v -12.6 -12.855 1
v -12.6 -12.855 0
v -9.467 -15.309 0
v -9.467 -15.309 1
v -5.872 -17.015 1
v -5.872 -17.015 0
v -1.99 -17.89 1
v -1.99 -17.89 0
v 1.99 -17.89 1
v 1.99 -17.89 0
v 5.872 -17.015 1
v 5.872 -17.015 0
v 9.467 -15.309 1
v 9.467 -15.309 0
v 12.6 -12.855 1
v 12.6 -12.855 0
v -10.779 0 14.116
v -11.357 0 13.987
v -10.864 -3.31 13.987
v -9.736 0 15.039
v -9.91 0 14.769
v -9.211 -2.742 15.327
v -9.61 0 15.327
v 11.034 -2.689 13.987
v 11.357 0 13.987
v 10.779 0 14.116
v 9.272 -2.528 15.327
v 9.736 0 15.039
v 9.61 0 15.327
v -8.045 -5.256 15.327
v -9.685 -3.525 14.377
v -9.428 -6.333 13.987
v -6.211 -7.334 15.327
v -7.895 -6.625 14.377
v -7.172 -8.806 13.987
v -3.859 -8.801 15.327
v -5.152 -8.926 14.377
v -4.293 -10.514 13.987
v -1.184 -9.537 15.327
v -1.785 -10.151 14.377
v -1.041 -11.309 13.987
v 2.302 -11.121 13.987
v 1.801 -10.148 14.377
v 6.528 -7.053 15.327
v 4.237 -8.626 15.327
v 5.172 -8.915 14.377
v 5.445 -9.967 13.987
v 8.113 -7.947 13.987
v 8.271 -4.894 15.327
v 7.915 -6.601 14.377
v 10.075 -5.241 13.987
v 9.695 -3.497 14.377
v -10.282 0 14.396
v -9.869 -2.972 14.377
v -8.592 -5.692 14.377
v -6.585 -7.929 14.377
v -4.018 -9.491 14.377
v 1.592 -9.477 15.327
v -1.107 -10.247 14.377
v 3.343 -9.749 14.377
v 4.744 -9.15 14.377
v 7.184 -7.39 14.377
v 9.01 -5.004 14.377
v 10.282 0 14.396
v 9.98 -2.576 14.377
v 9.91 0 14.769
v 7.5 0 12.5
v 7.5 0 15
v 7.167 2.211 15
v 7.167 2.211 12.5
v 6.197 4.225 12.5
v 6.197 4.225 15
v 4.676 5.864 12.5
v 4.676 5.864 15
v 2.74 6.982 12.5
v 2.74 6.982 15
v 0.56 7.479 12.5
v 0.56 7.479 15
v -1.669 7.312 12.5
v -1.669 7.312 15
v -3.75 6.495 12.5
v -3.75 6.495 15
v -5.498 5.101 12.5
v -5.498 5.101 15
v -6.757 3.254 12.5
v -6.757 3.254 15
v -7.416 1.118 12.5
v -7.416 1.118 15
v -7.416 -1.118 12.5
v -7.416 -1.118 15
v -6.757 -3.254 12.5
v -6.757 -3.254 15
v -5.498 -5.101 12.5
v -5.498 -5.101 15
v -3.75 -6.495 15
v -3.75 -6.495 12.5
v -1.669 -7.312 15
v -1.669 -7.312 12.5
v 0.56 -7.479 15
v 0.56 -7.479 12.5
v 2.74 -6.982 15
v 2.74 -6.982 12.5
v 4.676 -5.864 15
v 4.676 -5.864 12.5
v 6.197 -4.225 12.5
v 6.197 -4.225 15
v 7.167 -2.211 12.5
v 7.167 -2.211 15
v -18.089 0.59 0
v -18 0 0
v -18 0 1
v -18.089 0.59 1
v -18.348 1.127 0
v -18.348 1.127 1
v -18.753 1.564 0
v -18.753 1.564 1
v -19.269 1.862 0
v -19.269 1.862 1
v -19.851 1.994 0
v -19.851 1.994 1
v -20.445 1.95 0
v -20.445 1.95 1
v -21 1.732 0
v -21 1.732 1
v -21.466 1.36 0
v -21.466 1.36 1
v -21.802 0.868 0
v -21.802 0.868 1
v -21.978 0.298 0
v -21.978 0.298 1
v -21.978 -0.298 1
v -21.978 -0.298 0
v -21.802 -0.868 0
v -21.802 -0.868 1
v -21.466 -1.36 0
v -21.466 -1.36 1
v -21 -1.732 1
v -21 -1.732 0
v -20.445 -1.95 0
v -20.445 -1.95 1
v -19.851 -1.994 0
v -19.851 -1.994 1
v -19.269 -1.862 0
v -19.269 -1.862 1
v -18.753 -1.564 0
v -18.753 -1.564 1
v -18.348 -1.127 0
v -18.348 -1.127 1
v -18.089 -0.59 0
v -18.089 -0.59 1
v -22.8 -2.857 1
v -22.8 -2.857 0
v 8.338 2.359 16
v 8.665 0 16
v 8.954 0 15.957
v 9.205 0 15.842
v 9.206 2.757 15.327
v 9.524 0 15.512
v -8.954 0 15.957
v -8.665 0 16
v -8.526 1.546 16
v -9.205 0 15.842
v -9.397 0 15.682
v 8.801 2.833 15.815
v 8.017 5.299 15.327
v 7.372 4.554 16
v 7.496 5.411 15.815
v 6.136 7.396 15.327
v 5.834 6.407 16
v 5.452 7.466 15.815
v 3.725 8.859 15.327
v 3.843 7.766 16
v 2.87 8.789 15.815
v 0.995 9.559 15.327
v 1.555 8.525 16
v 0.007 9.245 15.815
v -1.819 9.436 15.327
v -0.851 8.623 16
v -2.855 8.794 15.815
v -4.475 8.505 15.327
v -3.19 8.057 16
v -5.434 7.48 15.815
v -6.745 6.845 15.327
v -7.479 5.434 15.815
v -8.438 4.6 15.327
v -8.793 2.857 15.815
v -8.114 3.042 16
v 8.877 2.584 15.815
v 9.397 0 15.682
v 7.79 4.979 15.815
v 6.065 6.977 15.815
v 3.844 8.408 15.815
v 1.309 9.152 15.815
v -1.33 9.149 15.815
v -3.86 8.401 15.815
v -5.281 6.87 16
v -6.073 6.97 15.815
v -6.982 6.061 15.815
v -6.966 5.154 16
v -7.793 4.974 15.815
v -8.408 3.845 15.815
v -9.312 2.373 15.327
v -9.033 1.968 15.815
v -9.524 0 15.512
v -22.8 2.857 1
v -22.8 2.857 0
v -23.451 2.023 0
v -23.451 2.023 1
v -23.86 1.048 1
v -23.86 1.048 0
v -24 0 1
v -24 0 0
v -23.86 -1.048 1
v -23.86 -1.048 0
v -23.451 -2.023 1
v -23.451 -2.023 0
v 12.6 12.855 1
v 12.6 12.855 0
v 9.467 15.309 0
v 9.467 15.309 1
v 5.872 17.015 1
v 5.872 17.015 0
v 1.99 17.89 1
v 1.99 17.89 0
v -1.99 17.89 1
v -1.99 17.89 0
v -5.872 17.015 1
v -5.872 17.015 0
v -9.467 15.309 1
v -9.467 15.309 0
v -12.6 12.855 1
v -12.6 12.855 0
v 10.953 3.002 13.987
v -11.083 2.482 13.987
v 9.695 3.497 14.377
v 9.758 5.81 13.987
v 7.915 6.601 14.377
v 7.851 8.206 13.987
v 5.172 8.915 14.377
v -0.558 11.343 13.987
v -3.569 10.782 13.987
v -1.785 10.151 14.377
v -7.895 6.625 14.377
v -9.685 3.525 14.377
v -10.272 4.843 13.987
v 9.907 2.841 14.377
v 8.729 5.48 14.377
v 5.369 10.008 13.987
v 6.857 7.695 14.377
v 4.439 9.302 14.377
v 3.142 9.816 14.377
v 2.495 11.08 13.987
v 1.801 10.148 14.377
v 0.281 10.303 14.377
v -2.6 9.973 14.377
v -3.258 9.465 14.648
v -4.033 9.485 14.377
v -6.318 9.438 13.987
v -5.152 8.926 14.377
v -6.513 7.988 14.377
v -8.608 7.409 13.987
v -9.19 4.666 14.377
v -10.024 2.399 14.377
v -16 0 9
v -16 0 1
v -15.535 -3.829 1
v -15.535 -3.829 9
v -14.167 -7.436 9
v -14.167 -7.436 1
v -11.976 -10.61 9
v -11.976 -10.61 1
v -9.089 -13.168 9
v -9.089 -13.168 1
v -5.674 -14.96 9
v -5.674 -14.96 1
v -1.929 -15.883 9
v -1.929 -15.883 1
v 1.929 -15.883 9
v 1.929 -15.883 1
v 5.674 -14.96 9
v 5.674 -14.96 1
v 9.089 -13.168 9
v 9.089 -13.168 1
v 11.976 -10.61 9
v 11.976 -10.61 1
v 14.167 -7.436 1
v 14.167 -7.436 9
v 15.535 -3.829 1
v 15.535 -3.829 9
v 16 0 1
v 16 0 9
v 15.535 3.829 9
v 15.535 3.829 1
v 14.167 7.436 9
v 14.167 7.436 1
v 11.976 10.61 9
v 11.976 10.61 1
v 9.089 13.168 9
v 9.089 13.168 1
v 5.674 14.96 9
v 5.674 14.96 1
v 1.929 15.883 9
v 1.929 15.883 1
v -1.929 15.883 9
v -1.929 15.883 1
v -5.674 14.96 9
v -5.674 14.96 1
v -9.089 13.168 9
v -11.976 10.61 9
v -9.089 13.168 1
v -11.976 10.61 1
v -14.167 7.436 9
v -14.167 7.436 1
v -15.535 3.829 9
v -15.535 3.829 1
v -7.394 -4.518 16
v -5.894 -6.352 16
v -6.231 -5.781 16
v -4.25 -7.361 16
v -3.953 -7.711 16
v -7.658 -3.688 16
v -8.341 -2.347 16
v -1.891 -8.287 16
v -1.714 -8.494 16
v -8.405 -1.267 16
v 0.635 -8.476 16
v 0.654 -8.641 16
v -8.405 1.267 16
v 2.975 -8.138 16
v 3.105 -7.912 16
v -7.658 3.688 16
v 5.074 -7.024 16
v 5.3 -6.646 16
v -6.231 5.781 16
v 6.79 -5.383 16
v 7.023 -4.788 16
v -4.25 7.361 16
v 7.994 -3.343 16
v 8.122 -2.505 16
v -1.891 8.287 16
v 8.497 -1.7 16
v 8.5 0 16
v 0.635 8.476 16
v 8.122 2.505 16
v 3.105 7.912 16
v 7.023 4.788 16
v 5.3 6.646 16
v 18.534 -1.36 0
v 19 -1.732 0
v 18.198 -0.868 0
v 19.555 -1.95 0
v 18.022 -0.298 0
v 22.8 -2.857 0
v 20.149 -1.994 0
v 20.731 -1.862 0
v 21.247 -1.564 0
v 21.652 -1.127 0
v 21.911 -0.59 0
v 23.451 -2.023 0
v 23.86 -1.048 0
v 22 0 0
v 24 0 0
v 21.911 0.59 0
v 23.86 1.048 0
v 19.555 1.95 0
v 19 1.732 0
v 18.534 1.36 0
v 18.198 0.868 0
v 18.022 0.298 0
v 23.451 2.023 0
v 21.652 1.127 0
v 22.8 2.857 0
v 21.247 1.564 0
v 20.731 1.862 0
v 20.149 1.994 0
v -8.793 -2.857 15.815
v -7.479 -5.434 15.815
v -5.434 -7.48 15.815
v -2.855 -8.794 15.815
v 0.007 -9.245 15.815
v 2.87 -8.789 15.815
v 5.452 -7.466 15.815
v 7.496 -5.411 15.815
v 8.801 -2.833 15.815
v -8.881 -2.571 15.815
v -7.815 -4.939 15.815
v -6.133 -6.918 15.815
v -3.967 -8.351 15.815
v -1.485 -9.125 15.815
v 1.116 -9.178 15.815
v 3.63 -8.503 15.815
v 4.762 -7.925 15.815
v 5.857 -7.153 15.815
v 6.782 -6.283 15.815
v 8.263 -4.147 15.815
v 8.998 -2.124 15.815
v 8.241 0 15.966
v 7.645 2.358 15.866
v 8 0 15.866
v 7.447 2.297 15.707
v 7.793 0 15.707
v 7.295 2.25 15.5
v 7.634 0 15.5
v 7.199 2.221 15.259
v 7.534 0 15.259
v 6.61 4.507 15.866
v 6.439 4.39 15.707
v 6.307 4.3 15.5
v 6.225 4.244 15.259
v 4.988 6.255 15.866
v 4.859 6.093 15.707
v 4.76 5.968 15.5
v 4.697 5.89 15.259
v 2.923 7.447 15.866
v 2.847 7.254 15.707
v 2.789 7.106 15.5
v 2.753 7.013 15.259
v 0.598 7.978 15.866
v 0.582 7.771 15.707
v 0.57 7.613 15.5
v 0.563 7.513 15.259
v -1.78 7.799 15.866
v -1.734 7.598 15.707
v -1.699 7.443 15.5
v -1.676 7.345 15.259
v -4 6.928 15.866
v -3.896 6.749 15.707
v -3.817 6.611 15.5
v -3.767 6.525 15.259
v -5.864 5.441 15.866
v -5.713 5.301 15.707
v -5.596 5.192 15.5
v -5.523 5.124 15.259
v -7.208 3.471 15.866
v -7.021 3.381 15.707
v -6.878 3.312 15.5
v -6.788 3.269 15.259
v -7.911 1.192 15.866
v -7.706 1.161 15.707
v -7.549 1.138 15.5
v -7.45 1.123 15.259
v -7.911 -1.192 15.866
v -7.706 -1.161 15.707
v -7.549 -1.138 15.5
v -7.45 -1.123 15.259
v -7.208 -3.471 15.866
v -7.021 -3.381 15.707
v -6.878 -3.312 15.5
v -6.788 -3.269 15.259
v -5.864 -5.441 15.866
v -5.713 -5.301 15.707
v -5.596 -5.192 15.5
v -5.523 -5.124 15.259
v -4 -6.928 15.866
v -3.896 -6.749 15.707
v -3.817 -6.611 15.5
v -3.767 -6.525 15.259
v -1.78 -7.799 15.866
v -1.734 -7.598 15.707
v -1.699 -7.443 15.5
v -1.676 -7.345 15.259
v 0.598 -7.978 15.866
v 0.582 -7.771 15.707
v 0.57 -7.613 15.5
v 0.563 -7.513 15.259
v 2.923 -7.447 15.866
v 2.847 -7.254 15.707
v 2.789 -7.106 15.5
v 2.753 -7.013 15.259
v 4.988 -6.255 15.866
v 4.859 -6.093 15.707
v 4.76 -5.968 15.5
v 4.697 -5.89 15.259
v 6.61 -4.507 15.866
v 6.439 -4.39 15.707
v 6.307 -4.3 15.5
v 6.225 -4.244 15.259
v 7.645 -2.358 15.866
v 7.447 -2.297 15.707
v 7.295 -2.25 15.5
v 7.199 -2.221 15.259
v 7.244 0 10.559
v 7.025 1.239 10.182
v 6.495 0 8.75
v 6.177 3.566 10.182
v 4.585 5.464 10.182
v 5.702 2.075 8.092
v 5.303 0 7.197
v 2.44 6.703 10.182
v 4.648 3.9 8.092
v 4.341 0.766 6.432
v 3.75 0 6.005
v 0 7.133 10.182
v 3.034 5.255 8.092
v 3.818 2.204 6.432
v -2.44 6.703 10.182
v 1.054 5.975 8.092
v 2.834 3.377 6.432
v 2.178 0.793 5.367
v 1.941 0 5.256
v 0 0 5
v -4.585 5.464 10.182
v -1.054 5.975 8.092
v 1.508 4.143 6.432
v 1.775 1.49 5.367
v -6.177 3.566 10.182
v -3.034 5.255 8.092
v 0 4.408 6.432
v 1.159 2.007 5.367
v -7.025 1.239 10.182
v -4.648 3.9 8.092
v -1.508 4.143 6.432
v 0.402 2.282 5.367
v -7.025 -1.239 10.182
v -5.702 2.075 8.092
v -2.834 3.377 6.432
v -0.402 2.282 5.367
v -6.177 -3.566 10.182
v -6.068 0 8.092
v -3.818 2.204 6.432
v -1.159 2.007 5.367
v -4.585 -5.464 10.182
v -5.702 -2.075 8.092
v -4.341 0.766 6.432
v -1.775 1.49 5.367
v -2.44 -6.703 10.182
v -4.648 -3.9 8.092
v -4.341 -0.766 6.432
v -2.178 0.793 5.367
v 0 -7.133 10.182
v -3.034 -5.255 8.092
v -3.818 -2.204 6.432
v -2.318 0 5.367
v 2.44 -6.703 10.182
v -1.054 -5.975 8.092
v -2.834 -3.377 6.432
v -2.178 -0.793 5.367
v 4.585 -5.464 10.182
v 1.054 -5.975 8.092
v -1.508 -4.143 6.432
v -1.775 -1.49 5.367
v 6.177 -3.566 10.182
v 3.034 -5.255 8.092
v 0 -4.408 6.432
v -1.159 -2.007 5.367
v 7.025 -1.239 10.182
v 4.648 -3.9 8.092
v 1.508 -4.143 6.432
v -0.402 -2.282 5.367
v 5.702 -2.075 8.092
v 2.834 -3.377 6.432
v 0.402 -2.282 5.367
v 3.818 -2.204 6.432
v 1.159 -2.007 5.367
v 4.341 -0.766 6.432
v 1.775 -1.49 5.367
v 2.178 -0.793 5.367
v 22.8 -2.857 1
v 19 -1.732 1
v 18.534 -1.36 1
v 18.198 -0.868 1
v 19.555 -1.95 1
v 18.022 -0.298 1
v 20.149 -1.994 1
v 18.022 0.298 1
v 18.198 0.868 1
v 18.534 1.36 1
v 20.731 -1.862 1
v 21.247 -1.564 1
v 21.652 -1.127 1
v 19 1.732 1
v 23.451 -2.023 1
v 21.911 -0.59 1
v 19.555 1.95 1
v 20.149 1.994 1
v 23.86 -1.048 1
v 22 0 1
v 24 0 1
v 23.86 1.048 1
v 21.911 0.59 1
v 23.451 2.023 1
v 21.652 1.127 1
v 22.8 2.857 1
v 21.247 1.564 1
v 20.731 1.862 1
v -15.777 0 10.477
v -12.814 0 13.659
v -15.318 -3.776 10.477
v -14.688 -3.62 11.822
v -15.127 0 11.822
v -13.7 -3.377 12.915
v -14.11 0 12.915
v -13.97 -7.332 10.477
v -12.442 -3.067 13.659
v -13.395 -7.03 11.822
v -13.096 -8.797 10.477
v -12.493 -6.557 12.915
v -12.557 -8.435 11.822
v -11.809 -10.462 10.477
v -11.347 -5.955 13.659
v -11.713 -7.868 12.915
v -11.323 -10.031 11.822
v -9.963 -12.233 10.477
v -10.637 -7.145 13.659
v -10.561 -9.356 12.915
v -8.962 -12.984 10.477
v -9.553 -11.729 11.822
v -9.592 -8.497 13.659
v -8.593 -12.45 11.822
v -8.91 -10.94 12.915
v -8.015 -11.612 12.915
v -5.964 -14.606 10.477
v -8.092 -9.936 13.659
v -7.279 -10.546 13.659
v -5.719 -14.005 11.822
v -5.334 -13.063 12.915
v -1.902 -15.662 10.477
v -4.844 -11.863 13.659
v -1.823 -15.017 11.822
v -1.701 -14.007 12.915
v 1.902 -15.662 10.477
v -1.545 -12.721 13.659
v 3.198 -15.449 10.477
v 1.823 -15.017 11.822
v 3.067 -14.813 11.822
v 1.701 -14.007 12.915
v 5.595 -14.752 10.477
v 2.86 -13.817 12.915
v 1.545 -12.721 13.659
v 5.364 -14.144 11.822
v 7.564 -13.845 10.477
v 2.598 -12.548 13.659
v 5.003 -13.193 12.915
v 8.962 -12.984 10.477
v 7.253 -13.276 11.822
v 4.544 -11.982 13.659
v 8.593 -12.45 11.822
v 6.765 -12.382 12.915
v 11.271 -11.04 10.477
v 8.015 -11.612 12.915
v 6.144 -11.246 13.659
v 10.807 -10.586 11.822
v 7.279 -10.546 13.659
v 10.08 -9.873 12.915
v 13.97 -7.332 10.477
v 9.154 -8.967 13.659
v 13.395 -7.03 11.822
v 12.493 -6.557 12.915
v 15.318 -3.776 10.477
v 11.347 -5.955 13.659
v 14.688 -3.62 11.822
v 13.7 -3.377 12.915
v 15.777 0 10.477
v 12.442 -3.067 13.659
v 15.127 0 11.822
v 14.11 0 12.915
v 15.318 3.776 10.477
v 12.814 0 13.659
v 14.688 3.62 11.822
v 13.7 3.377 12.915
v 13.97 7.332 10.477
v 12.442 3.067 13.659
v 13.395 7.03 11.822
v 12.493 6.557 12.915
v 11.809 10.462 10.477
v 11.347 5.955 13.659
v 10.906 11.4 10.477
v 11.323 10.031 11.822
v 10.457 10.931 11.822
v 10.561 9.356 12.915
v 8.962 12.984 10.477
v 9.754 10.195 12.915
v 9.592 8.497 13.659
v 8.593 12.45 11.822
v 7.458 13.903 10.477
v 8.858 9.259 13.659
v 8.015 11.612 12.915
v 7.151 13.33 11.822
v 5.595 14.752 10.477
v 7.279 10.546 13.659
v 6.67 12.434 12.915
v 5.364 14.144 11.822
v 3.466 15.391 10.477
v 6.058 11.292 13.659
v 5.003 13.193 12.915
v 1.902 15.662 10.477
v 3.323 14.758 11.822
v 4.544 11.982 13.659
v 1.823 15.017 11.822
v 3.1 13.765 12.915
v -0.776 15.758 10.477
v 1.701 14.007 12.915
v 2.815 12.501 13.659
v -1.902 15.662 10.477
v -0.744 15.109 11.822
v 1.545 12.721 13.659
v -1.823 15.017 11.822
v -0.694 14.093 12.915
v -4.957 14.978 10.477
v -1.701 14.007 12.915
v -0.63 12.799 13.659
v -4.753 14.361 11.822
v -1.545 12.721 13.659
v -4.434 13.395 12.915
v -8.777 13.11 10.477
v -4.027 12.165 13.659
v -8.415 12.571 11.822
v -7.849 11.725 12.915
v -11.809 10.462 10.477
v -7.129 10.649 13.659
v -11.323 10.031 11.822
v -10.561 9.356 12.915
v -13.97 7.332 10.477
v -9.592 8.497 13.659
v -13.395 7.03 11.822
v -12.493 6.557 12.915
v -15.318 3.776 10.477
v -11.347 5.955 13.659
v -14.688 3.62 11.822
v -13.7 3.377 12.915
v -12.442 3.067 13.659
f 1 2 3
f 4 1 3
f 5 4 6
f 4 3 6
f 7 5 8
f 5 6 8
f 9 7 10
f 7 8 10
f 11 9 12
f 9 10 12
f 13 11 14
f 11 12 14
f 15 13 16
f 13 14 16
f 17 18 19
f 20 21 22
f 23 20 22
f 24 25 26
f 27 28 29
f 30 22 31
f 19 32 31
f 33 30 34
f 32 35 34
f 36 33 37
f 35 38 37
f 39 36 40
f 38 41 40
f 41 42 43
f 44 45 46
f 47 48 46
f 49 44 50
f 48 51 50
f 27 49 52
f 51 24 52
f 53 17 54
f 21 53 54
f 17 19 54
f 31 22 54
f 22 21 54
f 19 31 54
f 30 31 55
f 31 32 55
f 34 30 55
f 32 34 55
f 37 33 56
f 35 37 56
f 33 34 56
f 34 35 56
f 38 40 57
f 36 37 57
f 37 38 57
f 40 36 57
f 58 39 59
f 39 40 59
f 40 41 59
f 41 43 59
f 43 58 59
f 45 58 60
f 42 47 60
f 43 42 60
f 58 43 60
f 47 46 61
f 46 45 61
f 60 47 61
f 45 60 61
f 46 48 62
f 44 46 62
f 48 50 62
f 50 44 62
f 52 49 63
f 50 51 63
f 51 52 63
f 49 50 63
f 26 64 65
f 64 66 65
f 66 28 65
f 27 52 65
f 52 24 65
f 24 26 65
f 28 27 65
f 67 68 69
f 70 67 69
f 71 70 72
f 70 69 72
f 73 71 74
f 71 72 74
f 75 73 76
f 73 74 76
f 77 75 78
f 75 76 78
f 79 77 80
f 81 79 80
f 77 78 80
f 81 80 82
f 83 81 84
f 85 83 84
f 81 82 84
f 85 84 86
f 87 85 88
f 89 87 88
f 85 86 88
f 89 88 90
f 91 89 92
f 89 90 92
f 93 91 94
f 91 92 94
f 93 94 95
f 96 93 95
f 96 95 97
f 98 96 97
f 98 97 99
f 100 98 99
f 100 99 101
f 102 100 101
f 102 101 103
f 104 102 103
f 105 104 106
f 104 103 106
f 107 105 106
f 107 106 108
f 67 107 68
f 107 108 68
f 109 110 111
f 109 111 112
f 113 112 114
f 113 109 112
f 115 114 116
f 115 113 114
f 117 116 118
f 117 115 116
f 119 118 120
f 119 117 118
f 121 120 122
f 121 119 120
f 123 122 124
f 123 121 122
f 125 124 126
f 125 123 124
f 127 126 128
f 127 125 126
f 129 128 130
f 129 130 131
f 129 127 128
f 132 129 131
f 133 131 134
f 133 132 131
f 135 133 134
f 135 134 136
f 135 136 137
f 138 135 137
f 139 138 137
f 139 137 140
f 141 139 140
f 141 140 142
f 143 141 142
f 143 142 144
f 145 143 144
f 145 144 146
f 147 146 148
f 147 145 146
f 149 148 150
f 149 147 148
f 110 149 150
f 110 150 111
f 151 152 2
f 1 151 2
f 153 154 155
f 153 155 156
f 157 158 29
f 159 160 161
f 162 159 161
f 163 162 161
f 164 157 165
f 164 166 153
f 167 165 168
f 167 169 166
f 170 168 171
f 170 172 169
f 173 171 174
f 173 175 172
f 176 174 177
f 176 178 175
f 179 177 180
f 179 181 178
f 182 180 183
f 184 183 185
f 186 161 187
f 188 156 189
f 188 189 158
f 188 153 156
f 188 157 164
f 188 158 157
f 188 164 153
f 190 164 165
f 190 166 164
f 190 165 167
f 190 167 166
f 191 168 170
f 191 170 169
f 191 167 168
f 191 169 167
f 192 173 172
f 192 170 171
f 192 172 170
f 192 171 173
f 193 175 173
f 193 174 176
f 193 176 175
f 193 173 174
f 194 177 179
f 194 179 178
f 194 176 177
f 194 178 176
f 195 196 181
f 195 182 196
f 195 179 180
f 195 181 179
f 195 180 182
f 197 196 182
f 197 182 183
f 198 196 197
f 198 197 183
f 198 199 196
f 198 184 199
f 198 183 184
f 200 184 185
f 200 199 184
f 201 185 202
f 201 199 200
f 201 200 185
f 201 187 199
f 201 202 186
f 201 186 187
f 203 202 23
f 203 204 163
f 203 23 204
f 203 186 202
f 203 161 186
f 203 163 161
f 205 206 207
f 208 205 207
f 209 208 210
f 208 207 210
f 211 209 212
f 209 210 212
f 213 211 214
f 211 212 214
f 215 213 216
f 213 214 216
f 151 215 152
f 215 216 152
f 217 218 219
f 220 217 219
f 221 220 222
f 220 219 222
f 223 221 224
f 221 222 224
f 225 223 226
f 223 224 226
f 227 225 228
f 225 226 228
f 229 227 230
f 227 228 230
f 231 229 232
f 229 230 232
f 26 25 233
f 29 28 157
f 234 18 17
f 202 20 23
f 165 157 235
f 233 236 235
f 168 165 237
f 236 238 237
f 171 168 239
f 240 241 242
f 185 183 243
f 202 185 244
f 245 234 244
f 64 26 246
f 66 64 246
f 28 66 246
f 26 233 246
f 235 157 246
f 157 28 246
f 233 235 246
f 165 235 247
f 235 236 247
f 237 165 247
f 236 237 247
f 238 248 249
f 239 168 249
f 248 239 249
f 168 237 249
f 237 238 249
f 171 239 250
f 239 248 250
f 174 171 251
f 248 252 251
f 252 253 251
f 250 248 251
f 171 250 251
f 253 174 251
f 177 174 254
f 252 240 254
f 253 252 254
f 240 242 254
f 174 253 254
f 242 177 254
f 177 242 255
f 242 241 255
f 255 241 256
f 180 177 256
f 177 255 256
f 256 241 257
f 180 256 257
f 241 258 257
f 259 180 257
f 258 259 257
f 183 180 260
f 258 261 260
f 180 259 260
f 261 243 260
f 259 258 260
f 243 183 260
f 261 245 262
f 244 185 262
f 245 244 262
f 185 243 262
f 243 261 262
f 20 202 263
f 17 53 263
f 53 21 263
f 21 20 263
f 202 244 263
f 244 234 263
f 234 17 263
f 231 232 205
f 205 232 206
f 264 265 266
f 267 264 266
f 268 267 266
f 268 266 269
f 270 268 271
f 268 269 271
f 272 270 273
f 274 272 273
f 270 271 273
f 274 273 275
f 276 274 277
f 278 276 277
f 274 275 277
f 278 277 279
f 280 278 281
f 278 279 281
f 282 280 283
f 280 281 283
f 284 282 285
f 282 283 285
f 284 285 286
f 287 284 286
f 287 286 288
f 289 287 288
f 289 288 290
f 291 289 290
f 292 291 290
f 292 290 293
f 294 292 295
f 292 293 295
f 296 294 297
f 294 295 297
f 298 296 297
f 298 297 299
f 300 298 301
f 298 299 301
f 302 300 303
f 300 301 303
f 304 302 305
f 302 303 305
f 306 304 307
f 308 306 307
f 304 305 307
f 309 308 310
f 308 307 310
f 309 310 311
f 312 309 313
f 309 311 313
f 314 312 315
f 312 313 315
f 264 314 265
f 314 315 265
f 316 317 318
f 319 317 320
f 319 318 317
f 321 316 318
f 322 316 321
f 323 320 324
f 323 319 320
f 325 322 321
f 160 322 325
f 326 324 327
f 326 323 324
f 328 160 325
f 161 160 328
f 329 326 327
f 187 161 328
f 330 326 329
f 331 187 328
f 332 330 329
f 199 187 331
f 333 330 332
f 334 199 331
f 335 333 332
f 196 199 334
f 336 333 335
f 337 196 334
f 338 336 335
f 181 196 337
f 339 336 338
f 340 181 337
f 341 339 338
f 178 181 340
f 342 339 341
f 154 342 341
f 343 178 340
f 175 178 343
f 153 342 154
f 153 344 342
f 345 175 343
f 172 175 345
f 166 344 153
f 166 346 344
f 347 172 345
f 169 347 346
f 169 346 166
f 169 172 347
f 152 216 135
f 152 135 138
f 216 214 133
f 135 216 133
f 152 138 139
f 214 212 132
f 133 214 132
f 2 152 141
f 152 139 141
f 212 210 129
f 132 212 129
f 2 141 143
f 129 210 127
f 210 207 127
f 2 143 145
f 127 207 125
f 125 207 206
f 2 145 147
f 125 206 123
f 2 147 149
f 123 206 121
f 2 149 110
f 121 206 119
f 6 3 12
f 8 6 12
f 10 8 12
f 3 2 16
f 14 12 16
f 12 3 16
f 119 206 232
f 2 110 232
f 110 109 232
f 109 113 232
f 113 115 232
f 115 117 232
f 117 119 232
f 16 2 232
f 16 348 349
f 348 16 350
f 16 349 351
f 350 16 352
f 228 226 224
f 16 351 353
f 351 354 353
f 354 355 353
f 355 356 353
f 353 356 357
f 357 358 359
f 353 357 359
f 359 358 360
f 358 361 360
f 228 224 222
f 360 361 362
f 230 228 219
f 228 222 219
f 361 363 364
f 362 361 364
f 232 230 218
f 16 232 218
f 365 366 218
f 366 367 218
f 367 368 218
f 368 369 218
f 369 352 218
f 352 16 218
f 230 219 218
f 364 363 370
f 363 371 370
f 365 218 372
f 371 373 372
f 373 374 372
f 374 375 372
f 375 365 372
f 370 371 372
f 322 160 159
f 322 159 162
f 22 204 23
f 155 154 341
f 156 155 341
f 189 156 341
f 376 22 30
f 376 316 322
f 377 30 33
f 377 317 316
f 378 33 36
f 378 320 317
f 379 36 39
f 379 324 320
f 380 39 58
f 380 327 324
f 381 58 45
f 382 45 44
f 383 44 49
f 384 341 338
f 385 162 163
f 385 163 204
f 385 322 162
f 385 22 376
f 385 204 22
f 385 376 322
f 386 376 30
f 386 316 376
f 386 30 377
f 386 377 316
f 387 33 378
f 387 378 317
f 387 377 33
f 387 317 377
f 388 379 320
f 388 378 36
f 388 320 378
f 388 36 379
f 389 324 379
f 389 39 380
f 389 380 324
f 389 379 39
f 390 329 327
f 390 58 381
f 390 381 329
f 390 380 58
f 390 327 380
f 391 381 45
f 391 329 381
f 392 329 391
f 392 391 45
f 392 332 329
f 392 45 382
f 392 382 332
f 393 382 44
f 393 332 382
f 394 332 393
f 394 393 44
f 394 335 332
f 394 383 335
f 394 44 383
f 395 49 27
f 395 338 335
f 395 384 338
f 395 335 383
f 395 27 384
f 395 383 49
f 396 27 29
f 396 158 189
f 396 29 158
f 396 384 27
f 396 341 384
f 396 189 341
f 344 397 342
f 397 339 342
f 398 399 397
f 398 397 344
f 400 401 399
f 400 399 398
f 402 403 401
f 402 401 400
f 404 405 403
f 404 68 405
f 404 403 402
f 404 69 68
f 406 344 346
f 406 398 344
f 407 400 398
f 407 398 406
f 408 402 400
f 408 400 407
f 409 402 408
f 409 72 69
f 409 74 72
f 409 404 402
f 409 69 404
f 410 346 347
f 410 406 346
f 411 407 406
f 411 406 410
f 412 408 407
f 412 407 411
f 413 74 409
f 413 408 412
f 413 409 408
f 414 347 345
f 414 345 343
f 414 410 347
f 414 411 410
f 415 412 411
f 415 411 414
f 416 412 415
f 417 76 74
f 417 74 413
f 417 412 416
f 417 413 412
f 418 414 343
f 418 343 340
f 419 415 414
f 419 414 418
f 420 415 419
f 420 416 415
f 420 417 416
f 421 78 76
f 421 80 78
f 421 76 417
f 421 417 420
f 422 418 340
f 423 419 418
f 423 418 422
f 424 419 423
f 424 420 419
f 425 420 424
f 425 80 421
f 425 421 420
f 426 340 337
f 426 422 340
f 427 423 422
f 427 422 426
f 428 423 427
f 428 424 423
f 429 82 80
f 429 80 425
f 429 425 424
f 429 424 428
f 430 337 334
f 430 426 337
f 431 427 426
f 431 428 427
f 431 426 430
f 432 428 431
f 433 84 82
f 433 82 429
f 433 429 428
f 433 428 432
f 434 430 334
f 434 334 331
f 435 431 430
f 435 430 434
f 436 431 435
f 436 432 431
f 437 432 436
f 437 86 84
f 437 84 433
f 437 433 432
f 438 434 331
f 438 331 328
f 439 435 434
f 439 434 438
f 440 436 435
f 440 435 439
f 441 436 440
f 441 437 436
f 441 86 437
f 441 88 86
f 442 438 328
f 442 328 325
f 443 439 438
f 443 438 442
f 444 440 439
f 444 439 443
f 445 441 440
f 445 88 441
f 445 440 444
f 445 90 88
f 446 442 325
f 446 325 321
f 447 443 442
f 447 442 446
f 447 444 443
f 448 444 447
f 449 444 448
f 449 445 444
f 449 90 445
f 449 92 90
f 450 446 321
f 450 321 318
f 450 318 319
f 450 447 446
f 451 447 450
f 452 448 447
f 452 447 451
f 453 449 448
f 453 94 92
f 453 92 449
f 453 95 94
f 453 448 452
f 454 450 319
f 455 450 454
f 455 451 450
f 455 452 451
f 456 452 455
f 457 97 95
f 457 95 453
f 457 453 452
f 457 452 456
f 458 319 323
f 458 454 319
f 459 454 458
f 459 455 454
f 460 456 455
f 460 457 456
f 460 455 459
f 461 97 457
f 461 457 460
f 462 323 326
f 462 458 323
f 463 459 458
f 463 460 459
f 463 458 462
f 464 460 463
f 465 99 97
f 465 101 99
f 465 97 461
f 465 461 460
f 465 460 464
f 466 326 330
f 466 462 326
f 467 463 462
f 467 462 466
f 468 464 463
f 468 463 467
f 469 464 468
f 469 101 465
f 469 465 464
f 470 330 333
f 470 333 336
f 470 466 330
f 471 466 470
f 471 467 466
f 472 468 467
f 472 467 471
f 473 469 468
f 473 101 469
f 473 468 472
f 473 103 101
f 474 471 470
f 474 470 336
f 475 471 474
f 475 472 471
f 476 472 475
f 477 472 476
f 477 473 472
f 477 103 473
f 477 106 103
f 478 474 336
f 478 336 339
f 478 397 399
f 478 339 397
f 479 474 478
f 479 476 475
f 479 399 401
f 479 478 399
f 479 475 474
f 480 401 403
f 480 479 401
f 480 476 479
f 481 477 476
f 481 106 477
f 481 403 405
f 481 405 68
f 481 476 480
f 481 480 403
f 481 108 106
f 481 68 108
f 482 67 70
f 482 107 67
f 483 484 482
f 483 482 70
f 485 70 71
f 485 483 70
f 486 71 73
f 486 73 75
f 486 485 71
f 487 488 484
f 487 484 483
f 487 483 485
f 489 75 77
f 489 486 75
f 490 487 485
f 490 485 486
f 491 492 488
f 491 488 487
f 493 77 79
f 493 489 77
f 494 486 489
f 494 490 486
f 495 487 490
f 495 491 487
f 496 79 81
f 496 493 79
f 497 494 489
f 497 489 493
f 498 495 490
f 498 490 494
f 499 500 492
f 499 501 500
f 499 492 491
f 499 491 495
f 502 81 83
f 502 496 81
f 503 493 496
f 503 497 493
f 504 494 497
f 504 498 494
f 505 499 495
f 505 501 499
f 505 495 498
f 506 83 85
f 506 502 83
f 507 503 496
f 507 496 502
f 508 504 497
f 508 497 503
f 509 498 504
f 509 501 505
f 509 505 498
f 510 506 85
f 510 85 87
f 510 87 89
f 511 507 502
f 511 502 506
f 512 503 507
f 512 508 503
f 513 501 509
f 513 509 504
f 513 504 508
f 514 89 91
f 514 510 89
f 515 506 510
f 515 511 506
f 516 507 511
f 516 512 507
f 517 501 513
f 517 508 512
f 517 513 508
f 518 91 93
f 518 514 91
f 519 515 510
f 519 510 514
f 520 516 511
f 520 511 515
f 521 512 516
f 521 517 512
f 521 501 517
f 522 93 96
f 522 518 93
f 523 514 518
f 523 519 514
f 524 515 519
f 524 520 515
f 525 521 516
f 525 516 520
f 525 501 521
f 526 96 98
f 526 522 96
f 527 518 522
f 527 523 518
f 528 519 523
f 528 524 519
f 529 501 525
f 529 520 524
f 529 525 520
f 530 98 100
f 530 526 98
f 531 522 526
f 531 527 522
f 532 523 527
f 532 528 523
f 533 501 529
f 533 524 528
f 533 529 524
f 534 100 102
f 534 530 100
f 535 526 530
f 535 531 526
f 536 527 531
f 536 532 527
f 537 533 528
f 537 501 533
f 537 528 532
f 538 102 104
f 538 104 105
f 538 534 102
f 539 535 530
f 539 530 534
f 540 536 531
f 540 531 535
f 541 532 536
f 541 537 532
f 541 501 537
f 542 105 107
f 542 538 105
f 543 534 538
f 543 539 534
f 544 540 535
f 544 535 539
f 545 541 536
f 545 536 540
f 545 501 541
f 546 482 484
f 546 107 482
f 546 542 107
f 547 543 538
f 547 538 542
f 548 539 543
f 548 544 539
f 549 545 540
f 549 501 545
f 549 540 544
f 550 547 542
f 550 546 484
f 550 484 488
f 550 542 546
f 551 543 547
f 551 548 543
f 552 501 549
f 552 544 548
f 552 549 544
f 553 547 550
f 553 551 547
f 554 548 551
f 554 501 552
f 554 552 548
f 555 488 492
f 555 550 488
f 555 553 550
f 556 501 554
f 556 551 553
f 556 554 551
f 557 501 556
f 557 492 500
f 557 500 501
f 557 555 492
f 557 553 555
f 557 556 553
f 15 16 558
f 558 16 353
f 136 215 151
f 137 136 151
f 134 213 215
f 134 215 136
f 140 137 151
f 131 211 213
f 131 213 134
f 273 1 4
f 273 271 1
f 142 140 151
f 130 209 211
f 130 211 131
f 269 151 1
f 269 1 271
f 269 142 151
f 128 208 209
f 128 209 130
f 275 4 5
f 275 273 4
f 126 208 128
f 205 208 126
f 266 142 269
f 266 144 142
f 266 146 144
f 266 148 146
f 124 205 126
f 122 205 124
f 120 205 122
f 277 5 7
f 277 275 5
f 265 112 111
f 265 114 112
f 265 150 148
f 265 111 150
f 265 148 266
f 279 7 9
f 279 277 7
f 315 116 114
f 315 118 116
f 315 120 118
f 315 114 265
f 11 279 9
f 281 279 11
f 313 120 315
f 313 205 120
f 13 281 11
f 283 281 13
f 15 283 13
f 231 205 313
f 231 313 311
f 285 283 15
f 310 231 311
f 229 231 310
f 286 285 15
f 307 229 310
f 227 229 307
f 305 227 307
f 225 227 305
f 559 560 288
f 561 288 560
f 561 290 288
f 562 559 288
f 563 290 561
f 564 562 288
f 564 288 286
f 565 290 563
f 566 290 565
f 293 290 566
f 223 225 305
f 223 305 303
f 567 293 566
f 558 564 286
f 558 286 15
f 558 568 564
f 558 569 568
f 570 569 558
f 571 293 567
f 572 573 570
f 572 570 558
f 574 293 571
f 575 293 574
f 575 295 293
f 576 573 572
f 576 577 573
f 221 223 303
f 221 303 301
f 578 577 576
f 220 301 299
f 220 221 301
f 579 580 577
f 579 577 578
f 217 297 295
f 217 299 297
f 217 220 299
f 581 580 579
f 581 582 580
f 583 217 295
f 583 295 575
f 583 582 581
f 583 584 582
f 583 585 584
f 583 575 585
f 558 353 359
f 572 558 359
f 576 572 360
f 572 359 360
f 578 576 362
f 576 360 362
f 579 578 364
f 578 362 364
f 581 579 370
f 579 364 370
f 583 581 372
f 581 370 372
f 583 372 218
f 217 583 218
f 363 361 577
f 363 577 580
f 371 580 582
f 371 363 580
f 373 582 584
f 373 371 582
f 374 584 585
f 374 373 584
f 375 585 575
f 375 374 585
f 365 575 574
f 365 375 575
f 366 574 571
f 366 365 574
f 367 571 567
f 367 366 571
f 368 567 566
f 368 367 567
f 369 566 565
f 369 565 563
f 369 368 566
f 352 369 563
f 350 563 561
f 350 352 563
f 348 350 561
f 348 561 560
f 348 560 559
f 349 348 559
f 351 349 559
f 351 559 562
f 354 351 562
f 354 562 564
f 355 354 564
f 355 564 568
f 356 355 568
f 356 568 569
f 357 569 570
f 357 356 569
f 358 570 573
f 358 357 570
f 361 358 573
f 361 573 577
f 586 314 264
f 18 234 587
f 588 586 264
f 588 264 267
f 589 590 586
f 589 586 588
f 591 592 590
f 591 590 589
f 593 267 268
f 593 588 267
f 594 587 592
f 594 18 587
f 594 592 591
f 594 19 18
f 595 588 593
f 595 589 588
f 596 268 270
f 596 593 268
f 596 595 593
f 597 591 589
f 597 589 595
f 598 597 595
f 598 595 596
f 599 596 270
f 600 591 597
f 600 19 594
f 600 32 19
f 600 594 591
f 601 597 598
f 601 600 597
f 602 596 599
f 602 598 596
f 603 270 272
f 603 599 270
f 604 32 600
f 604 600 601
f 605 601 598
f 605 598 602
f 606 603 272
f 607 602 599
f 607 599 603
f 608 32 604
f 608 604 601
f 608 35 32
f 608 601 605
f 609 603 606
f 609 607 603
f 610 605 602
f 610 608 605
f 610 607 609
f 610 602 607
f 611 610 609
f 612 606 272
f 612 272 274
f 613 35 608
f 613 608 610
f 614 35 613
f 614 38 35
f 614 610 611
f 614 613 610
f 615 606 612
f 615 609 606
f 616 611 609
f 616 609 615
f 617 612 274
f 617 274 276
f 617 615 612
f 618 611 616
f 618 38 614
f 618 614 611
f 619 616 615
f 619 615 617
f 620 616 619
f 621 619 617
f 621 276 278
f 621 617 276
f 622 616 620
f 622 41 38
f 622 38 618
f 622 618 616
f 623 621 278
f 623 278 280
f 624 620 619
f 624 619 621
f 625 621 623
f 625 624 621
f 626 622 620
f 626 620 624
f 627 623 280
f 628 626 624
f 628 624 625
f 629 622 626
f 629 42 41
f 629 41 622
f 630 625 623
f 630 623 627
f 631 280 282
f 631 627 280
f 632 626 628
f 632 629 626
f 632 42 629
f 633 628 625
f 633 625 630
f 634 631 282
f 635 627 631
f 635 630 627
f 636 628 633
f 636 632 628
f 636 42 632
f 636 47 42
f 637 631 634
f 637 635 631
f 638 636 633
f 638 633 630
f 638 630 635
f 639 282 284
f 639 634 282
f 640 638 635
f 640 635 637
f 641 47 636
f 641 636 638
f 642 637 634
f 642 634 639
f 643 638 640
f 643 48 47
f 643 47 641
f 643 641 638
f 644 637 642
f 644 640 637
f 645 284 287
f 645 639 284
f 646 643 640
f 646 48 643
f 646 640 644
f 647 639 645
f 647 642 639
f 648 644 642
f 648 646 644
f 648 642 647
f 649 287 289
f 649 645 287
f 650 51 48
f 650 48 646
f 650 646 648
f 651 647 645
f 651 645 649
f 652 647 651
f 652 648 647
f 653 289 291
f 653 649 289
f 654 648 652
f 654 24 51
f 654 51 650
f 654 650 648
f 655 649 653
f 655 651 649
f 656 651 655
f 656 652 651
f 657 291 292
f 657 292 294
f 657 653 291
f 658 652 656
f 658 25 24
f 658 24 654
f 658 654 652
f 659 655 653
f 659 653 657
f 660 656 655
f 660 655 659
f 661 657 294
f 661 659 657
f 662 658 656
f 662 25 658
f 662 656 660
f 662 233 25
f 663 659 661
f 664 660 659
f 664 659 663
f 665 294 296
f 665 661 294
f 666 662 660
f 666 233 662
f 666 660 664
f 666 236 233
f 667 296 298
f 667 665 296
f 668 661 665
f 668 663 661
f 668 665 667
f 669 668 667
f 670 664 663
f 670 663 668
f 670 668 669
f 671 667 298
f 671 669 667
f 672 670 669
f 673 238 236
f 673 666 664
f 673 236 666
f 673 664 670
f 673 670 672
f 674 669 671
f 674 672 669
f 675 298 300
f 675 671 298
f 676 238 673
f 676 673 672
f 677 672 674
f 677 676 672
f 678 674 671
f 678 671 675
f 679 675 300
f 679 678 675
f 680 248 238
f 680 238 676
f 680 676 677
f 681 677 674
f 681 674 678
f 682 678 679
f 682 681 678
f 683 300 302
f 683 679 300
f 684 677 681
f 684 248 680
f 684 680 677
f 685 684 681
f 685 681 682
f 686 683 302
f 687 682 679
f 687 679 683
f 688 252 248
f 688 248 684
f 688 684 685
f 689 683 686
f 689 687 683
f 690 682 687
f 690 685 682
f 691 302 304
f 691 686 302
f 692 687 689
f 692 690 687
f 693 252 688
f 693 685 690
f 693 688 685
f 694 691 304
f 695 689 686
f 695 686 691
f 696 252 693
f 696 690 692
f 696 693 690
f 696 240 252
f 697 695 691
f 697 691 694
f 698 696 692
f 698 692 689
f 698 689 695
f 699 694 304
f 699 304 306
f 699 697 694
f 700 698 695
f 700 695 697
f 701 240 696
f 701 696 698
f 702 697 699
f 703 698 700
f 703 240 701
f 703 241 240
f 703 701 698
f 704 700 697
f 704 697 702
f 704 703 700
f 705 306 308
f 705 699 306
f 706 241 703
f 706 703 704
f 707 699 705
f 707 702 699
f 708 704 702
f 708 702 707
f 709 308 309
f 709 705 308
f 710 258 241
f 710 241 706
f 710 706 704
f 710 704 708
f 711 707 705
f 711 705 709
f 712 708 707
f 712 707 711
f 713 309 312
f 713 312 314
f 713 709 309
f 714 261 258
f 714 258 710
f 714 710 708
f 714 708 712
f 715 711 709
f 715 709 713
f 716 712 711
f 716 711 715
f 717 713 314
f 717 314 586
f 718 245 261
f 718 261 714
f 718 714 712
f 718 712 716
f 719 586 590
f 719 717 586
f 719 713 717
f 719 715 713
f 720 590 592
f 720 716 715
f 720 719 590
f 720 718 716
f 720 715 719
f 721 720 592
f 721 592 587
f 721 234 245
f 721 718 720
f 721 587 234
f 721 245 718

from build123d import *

# Parameters (mm, degrees)
SKETCH1_R           = 2
BOSS_EXTRUDE1_DEPTH = 1
SKETCH2_R           = 16
BOSS_EXTRUDE2_DEPTH = 13
SKETCH3_R           = 9.5
BOSS_EXTRUDE3_DEPTH = 2
FILLET1_R           = 5
FILLET2_R           = 2
SKETCH4_R           = 7.5
CUT_EXTRUDE1_DEPTH  = 11
FILLET3_R           = 7.5
FILLET4_R           = 1
FILLET5_R           = 1


with BuildPart() as part:
    # Sketch1 → Boss-Extrude1 (new body)
    with BuildSketch(Plane.XY):
        with BuildLine():
            Line((-12.6, 12.854571171), (-22.8, 2.856571371))
            ThreePointArc((-22.8, 2.856571371), (-24, 0), (-22.8, -2.856571371))
            Line((-22.8, -2.856571371), (-12.6, -12.854571171))
            ThreePointArc((-12.6, -12.854571171), (0, -18), (12.6, -12.854571171))
            Line((12.6, -12.854571171), (22.8, -2.856571371))
            ThreePointArc((22.8, -2.856571371), (24, 0), (22.8, 2.856571371))
            Line((22.8, 2.856571371), (12.6, 12.854571171))
            ThreePointArc((12.6, 12.854571171), (0, 18), (-12.6, 12.854571171))
        make_face()
        with Locations((-20, 0)):
            Circle(SKETCH1_R, mode=Mode.SUBTRACT)
        with Locations((20, 0)):
            Circle(SKETCH1_R, mode=Mode.SUBTRACT)
    extrude(amount=BOSS_EXTRUDE1_DEPTH)

    # Sketch2 → Boss-Extrude2 (add)
    with BuildSketch(Plane.XY.offset(1)):
        with Locations(Location((0, 0, 0), (0, 0, 180))):
            Circle(SKETCH2_R)
    extrude(amount=BOSS_EXTRUDE2_DEPTH)

    # Sketch3 → Boss-Extrude3 (add)
    with BuildSketch(Plane.XY.offset(14)):
        Circle(SKETCH3_R)
    extrude(amount=BOSS_EXTRUDE3_DEPTH)

    # Fillet1
    fillet1_edges = [part.edges().sort_by_distance(p)[0] for p in [
        (16, 0, 14),
    ]]
    fillet(fillet1_edges, radius=FILLET1_R)

    # Fillet2
    fillet2_edges = [part.edges().sort_by_distance(p)[0] for p in [
        (-9.5, 0, 14),
    ]]
    fillet(fillet2_edges, radius=FILLET2_R - 0.0001)  # a hair under: the kernel refuses the full size

    # Sketch4 → Cut-Extrude1 (cut)
    with BuildSketch(Plane.XY.offset(16)):
        Circle(SKETCH4_R)
    extrude(amount=-CUT_EXTRUDE1_DEPTH, mode=Mode.SUBTRACT)

    # Fillet3
    fillet3_edges = [part.edges().sort_by_distance(p)[0] for p in [
        (-7.5, 0, 5),
    ]]
    fillet(fillet3_edges, radius=FILLET3_R)

    # Fillet4
    fillet4_edges = [part.edges().sort_by_distance(p)[0] for p in [
        (-9.5, 0, 16),
    ]]
    fillet(fillet4_edges, radius=FILLET4_R)

    # Fillet5
    fillet5_edges = [part.edges().sort_by_distance(p)[0] for p in [
        (-7.5, 0, 16),
    ]]
    fillet(fillet5_edges, radius=FILLET5_R)


solid = part.part
